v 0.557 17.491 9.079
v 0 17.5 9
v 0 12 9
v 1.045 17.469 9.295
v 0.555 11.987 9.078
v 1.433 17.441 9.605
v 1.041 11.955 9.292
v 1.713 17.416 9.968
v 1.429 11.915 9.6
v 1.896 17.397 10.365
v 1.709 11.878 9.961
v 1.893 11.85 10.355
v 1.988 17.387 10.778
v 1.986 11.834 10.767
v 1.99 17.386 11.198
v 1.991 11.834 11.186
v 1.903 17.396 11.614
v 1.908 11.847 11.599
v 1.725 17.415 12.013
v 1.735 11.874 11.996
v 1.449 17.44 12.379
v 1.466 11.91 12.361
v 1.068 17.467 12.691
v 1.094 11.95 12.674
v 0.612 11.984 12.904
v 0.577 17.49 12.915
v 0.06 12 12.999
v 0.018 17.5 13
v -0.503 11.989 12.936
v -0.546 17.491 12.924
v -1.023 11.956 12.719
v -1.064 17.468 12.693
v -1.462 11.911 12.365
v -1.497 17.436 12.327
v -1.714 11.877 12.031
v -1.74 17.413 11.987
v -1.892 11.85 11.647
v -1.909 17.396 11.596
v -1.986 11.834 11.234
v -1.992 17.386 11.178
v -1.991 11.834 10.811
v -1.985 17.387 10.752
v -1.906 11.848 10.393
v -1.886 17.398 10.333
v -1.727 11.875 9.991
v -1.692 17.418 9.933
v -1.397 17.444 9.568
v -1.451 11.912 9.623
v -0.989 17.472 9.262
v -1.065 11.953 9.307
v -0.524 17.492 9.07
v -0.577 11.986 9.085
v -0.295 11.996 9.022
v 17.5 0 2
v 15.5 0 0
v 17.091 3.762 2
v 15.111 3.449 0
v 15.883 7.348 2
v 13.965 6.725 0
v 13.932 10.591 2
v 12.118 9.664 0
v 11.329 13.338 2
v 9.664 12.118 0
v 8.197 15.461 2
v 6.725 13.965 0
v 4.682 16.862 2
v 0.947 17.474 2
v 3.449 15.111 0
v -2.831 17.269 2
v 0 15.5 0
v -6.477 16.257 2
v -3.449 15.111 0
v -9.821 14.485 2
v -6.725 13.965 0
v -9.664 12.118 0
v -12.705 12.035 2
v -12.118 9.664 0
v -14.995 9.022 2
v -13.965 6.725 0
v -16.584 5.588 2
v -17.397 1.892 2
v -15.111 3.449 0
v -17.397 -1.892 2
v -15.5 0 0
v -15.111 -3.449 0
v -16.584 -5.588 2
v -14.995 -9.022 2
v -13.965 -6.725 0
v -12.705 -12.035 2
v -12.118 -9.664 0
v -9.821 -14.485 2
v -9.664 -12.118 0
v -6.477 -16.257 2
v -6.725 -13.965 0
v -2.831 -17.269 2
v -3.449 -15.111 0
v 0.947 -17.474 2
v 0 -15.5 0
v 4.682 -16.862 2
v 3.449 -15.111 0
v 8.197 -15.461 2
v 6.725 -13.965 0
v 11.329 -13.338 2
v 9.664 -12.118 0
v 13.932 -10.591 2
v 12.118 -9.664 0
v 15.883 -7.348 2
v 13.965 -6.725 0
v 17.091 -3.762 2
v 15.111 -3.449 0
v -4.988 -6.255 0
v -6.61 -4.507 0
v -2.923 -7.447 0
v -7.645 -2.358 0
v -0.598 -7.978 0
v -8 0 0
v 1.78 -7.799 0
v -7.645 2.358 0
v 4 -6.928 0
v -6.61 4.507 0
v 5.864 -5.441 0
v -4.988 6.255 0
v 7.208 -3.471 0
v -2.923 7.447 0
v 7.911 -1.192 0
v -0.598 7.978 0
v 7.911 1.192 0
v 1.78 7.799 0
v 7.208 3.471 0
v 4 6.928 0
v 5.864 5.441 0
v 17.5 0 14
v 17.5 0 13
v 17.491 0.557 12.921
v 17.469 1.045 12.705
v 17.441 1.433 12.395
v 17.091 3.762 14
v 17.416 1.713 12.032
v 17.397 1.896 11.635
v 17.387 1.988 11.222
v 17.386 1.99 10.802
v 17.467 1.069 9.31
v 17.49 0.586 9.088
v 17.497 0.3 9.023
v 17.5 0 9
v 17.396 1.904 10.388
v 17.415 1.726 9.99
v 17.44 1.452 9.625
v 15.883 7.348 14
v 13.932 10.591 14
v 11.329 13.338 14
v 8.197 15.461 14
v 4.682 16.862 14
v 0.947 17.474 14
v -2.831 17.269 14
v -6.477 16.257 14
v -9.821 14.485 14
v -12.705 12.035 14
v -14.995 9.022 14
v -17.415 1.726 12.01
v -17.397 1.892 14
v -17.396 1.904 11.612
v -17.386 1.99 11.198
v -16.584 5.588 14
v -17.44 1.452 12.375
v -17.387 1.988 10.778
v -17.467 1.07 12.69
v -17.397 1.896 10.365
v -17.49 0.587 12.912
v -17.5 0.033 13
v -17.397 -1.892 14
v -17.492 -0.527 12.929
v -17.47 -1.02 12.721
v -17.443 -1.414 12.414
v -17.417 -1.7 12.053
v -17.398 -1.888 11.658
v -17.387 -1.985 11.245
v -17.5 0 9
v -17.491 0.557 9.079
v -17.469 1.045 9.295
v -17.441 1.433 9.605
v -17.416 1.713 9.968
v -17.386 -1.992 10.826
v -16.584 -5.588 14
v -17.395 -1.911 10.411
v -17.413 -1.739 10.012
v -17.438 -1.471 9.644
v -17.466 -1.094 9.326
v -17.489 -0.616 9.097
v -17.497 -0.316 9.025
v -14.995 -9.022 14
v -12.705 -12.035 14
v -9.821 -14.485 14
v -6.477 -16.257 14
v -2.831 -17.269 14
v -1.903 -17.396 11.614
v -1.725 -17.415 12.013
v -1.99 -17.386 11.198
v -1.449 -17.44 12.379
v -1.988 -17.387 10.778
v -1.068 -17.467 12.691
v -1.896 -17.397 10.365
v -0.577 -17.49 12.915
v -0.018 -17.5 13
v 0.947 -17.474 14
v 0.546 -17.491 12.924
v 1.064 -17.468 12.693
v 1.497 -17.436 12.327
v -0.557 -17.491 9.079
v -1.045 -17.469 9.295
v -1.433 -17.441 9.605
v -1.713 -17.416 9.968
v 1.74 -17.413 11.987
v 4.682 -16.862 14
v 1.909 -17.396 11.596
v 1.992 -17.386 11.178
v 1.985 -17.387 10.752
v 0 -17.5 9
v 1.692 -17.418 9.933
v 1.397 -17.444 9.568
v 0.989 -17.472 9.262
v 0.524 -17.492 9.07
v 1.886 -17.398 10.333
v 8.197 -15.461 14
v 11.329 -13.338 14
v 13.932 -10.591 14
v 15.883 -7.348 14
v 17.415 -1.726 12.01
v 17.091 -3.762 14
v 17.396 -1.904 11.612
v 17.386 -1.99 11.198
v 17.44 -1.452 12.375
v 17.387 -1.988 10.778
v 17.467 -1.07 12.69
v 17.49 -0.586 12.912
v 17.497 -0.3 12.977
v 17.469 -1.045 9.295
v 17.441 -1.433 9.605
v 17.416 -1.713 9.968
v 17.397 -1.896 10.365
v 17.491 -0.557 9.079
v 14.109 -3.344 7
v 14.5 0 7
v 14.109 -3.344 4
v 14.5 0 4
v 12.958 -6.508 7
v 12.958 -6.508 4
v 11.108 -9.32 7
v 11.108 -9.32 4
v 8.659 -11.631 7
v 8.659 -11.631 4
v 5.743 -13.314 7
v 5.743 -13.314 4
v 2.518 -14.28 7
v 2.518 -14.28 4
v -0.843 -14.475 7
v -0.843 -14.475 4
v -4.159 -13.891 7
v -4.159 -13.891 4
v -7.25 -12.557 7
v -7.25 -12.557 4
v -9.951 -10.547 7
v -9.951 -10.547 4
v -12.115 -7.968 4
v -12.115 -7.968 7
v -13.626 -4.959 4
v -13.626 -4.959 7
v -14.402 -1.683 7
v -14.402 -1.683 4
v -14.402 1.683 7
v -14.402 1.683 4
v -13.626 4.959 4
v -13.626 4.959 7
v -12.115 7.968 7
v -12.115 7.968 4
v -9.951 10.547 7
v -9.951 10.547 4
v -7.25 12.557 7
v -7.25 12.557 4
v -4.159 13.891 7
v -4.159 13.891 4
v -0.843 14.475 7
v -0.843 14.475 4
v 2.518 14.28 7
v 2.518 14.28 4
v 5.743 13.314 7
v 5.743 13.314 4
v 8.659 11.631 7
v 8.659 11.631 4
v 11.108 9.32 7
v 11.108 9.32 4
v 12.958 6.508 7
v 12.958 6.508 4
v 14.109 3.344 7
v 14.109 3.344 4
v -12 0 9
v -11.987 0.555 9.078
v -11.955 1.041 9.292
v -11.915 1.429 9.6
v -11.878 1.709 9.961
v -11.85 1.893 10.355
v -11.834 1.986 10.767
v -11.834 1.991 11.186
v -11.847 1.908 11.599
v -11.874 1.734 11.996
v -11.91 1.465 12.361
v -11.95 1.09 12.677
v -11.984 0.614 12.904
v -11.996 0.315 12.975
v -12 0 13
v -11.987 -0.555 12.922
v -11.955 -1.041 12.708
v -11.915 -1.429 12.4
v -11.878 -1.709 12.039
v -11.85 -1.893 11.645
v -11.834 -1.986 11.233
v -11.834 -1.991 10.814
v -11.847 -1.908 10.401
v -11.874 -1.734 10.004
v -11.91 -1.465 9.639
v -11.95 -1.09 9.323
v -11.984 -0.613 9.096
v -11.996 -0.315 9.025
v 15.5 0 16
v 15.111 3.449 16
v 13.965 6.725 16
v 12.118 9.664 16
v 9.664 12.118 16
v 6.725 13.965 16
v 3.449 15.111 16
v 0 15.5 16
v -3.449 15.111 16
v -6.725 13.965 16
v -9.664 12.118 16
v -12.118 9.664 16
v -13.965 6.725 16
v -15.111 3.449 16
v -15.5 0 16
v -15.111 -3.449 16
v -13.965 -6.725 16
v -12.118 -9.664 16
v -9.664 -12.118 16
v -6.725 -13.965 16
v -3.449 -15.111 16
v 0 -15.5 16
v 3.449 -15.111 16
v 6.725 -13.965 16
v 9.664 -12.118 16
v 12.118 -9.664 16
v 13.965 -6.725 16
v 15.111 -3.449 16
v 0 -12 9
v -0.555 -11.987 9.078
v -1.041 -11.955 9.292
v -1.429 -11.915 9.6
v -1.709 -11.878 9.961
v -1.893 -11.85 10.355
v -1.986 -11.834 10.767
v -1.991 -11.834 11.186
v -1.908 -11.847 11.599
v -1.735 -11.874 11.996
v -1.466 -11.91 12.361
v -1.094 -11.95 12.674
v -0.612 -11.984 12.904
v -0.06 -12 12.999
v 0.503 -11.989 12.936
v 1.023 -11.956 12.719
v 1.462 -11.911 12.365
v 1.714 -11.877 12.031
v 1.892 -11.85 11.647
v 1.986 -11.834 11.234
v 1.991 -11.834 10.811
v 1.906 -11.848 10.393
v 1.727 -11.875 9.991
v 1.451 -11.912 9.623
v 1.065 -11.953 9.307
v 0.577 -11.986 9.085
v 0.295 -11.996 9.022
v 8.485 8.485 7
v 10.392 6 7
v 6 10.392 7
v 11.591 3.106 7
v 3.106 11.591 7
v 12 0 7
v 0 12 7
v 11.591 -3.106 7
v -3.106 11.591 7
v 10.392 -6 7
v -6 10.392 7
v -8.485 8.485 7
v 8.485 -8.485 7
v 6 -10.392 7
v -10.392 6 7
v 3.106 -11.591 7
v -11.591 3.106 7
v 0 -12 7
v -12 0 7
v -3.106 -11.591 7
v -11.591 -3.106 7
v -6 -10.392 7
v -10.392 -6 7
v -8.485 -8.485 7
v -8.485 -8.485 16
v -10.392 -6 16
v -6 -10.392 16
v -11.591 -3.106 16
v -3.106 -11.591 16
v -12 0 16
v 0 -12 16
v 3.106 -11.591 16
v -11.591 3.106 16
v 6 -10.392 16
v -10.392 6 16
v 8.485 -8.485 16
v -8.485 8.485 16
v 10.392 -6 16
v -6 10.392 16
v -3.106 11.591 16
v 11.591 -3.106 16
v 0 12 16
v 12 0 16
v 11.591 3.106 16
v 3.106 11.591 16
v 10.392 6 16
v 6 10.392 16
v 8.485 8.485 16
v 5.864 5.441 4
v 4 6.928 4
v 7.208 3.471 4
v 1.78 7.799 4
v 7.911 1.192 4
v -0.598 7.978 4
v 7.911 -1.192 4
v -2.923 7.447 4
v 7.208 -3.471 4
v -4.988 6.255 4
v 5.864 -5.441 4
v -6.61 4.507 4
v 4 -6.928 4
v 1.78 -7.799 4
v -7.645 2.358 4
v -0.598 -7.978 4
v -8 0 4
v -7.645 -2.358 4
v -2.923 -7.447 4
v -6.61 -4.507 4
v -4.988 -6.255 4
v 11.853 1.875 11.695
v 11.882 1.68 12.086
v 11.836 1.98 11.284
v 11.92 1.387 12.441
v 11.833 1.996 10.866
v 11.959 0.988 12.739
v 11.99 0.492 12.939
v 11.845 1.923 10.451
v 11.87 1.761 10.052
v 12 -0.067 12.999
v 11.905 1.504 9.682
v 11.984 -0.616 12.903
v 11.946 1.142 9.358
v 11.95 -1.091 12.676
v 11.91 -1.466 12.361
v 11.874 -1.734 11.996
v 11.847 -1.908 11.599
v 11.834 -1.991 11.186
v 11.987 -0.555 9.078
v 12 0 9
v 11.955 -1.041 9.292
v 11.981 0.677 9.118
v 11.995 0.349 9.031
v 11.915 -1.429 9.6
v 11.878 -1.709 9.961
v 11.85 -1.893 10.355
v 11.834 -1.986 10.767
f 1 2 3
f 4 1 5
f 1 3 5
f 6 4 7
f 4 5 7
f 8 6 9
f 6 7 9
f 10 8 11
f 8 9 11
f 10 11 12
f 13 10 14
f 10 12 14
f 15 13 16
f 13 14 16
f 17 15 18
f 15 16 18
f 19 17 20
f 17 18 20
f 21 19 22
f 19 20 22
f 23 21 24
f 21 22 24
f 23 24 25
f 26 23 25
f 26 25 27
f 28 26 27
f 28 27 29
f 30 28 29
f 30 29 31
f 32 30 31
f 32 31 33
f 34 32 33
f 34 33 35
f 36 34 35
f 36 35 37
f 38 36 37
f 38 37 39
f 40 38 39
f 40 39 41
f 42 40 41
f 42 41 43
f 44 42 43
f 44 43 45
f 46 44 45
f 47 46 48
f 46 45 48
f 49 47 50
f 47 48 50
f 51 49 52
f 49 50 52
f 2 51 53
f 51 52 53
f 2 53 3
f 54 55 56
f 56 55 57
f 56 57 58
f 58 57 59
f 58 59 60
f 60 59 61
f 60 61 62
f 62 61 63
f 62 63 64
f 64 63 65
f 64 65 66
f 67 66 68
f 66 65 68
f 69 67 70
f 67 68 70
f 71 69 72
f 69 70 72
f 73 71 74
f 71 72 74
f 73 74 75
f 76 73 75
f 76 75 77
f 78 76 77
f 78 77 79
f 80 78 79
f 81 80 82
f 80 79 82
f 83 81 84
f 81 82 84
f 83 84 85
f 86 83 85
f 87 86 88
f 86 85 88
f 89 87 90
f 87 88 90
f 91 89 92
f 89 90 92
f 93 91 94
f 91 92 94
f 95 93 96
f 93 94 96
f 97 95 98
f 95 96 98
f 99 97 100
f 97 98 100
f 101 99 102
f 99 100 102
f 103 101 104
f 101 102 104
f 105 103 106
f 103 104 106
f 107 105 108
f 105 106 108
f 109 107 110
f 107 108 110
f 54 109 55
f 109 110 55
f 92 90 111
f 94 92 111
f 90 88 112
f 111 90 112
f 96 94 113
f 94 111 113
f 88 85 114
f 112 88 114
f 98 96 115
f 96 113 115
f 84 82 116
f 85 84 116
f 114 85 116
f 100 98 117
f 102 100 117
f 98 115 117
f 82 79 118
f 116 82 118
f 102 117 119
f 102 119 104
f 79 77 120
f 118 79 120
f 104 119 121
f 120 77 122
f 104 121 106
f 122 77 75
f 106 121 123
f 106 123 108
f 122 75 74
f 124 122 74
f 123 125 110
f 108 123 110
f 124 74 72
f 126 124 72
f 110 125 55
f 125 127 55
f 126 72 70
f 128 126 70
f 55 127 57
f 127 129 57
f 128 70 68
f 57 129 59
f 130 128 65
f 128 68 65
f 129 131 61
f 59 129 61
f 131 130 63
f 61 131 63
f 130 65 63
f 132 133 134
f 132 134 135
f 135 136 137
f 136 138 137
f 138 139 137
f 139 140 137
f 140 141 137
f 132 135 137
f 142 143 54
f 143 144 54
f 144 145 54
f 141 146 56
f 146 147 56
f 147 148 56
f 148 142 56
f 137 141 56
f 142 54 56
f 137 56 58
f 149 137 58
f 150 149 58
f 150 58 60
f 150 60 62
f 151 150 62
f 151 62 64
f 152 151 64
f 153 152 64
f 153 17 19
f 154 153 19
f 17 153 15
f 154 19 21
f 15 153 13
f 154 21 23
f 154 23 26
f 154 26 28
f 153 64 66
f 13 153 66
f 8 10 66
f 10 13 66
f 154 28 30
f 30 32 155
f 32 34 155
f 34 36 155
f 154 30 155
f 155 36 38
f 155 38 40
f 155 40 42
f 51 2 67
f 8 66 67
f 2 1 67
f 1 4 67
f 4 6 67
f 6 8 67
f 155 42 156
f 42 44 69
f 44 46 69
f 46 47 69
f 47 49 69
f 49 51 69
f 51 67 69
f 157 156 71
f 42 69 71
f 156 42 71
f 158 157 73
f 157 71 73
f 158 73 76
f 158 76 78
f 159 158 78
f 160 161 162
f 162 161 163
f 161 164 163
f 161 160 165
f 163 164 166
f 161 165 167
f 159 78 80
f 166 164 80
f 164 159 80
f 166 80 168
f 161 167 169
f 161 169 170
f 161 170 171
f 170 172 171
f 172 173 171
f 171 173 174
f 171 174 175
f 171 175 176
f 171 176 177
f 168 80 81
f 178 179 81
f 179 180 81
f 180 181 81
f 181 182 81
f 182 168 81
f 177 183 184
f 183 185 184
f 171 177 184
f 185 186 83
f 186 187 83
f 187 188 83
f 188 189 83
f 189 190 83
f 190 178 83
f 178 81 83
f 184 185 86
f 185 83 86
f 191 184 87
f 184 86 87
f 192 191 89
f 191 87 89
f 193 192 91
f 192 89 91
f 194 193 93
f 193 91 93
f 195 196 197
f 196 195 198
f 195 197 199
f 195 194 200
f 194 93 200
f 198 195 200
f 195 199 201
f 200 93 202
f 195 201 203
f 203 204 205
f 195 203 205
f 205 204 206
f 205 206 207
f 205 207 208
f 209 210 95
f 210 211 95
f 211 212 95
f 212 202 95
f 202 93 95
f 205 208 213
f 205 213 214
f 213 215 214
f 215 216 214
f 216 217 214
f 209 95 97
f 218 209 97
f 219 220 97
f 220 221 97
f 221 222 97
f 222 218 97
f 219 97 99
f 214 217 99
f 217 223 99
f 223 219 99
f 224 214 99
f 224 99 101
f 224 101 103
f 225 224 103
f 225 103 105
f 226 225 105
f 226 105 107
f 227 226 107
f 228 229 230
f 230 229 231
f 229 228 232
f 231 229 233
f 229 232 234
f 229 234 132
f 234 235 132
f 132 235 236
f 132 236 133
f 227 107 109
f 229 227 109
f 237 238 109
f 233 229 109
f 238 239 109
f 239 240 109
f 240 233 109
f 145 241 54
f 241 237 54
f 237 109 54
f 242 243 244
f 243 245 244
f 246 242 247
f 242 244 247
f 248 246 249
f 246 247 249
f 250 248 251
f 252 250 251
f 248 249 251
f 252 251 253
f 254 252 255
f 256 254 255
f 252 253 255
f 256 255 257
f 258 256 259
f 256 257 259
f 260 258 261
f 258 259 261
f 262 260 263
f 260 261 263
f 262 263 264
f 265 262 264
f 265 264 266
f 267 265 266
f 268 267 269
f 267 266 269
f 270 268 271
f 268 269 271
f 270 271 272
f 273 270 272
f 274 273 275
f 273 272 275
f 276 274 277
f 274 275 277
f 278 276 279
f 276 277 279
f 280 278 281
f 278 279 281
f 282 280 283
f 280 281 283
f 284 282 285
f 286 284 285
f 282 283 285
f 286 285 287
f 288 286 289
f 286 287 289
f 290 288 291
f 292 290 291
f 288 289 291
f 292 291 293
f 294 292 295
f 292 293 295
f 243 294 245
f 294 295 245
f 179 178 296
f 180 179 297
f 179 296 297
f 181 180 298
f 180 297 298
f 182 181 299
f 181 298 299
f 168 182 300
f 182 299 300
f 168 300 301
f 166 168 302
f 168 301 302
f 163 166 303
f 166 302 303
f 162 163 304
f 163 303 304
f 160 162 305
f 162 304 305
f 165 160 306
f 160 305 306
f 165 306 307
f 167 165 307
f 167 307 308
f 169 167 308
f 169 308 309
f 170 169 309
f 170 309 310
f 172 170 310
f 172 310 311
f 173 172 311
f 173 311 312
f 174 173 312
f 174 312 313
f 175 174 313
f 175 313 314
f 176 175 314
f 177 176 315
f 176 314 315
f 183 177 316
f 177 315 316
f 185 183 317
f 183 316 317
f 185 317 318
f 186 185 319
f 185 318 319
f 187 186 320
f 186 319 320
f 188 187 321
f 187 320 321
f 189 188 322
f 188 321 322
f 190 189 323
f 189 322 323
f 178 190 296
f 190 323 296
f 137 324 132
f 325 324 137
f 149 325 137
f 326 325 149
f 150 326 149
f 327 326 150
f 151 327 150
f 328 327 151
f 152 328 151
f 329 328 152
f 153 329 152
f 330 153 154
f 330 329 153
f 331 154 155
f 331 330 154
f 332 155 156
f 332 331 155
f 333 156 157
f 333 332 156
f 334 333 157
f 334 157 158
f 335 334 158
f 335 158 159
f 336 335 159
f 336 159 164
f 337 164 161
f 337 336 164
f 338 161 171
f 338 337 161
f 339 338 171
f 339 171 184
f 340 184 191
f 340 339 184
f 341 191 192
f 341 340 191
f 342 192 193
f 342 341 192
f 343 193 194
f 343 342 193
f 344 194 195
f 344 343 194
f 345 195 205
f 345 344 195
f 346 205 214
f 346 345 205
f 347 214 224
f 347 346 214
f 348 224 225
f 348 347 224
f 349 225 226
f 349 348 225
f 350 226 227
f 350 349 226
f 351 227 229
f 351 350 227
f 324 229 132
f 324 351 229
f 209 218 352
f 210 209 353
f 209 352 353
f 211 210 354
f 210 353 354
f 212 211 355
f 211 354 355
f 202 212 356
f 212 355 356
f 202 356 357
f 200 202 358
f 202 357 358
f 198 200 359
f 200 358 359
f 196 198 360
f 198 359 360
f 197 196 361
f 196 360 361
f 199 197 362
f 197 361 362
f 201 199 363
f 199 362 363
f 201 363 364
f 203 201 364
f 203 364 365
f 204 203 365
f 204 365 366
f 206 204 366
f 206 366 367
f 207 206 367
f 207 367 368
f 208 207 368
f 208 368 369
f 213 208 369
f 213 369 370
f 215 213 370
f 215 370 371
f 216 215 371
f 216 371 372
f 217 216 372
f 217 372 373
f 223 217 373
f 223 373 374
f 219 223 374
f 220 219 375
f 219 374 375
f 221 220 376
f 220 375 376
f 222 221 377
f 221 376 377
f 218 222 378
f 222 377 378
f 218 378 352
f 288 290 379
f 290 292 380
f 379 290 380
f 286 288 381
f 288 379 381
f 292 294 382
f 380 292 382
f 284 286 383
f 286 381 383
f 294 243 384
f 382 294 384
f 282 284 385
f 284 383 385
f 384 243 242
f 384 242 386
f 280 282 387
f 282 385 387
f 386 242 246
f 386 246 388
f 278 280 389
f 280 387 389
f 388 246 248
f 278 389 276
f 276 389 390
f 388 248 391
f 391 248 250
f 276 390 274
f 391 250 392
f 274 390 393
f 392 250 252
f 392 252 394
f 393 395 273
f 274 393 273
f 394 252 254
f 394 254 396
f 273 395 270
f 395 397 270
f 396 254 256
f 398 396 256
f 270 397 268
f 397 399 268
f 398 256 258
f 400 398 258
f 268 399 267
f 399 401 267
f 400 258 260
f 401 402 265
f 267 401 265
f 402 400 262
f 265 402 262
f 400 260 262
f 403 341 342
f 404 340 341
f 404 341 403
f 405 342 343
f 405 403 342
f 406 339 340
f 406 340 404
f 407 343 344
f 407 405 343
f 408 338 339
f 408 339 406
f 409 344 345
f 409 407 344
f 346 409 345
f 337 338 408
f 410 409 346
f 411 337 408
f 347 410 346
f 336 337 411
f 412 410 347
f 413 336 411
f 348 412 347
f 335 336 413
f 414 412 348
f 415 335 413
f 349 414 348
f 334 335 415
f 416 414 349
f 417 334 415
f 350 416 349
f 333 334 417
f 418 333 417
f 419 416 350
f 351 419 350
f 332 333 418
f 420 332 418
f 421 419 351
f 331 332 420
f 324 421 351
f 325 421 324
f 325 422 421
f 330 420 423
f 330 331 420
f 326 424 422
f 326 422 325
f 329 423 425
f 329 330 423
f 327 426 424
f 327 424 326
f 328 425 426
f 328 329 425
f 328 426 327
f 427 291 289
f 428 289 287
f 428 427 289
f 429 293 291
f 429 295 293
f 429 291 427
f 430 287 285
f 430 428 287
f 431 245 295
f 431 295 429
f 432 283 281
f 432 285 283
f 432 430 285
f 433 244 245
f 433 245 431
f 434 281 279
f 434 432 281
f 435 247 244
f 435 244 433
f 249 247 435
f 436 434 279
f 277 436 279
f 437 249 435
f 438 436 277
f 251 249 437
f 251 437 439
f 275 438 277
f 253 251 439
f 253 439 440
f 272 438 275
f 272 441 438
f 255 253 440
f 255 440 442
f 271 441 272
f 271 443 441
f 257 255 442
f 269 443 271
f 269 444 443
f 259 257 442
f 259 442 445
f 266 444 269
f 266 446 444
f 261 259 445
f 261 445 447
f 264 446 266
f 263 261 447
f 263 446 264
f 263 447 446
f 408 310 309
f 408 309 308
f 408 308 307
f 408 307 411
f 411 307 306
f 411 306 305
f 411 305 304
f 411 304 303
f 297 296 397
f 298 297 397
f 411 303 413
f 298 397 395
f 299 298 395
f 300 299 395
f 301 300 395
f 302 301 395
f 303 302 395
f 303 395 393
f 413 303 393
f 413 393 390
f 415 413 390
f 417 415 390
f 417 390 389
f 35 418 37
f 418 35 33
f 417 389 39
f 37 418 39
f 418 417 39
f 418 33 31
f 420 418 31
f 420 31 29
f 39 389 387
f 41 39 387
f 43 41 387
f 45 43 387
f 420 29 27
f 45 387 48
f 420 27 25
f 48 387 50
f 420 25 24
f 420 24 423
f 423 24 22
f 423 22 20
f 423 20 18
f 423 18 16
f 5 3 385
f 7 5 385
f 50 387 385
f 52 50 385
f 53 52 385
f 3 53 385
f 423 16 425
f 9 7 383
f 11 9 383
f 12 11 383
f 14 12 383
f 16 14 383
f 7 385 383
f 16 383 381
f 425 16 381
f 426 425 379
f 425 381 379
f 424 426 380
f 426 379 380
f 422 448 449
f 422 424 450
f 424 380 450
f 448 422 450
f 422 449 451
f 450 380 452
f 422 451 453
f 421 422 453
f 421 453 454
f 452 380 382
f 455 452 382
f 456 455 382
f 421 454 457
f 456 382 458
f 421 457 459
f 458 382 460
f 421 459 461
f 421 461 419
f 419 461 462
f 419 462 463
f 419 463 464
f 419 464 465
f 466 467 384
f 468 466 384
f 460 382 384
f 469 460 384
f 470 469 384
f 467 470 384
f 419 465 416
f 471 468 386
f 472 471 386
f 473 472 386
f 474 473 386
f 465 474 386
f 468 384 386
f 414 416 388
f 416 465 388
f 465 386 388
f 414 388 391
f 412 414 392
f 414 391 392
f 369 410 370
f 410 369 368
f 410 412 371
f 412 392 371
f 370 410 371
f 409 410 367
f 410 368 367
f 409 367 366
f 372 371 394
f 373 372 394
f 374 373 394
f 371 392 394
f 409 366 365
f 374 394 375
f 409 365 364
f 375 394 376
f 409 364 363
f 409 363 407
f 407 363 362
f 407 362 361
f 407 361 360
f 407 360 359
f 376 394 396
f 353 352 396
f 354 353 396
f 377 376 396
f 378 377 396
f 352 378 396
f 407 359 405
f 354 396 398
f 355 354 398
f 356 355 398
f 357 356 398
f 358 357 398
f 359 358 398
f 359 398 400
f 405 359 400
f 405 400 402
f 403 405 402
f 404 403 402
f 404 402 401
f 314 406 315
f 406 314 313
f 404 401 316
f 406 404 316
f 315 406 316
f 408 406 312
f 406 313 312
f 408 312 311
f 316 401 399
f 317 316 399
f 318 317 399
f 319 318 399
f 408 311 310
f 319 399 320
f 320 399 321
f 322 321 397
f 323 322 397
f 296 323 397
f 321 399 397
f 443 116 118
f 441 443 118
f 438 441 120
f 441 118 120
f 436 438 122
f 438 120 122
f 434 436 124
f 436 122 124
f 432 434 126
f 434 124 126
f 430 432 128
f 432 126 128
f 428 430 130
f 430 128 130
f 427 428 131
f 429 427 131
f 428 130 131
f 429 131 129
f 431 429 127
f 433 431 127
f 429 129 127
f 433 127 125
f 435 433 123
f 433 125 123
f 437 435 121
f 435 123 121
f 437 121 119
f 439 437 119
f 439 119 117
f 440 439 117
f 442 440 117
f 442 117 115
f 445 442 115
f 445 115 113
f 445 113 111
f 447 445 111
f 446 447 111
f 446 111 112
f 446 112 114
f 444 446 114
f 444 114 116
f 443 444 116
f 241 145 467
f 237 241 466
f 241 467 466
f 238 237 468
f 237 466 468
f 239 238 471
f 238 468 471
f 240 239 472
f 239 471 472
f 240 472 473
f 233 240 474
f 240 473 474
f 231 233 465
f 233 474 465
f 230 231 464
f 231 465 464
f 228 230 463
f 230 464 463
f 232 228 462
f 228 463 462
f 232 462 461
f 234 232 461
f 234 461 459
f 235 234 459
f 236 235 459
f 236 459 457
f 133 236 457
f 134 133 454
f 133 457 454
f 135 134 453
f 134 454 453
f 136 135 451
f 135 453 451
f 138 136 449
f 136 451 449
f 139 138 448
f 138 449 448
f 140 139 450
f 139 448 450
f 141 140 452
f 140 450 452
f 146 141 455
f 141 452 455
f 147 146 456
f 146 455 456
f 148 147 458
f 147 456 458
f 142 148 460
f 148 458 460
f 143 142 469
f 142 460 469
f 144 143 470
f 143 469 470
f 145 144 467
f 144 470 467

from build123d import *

# Parameters (mm, degrees)
SKETCH_1_R               = 17.5
EXTRUDE_1_DEPTH          = 16
HOLE_WIZARD_M27_1_D      = 24
HOLE_WIZARD_M27_1_DEPTH  = 9
HOLE_WIZARD_M27_1_TIP    = 6.92820323
SKETCH_4_R               = 17.5
EXTRUDE_2_DEPTH          = 4
SKETCH_5_W               = 3
SKETCH_5_H               = 10
SKETCH_6_R               = 2
CUT_EXTRUDE_1_DEPTH      = 30.470324057
PATTERN_CIRCULAR_1_COUNT = 4
SKETCH_7_R               = 8
CUT_EXTRUDE_2_DEPTH      = 30.47032423
CHAMFER_1_SIZE           = 2


with BuildPart() as part:
    # 草图1 → 凸台-拉伸1 (new body)
    with BuildSketch(Plane.XY):
        Circle(SKETCH_1_R)
    extrude(amount=EXTRUDE_1_DEPTH)

    # M27 螺纹孔1
    with Locations(Plane.XY.offset(16)):
        with Locations((0, 0)):
            Hole(HOLE_WIZARD_M27_1_D / 2, depth=HOLE_WIZARD_M27_1_DEPTH)
            with Locations((0, 0, -(HOLE_WIZARD_M27_1_DEPTH + HOLE_WIZARD_M27_1_TIP / 2))):  # 120° drill point
                Cone(0, HOLE_WIZARD_M27_1_D / 2, HOLE_WIZARD_M27_1_TIP, mode=Mode.SUBTRACT)

    # 草图4 → 凸台-拉伸2 (add)
    with BuildSketch(Plane(origin=(0, 0, 0), x_dir=(-1, 0, 0), z_dir=(0, 0, -1))):
        with Locations(Location((0, 0, 0), (0, 0, 180))):
            Circle(SKETCH_4_R)
    extrude_2 = extrude(amount=-EXTRUDE_2_DEPTH)

    # 草图5 → 切除-旋转1 (revolve, cut)
    with BuildSketch(Plane(origin=(0, 0, 0), x_dir=(0, 0, -1), z_dir=(1, 0, 0)), mode=Mode.PRIVATE) as cut_revolve_1_sk:
        with Locations((-5.5, 9.5)):
            Rectangle(SKETCH_5_W, SKETCH_5_H)
    revolve(cut_revolve_1_sk.sketch.rotate(Axis((0, 0, 16), (0, 0, -1)), 90), axis=Axis((0, 0, 16), (0, 0, -1)), mode=Mode.SUBTRACT)

    # 草图6 → 切除-拉伸1 (cut, through all)
    with BuildSketch(Plane(origin=(0, 0, 0), x_dir=(0, 0, -1), z_dir=(1, 0, 0))):
        with Locations((-11, 0)):
            Circle(SKETCH_6_R)
    cut_extrude_1 = extrude(amount=-CUT_EXTRUDE_1_DEPTH, mode=Mode.SUBTRACT)

    # 阵列(圆周)1: 凸台-拉伸2, 切除-拉伸1 ×4 about axis
    pattern_circular_1_axis = Axis((0, 0, 16), (0, 0, -1))
    add([extrude_2.rotate(pattern_circular_1_axis, i * 360 / PATTERN_CIRCULAR_1_COUNT) for i in range(1, PATTERN_CIRCULAR_1_COUNT)])
    add([cut_extrude_1.rotate(pattern_circular_1_axis, i * 360 / PATTERN_CIRCULAR_1_COUNT) for i in range(1, PATTERN_CIRCULAR_1_COUNT)], mode=Mode.SUBTRACT)

    # 草图7 → 切除-拉伸2 (cut, through all)
    with BuildSketch(Plane(origin=(0, 0, 0), x_dir=(-1, 0, 0), z_dir=(0, 0, -1))):
        Circle(SKETCH_7_R)
    extrude(amount=-CUT_EXTRUDE_2_DEPTH, mode=Mode.SUBTRACT)

    # 倒角1
    chamfer_1_edges = [part.edges().sort_by_distance(p)[0] for p in [
        (-17.5, 0, 0),
        (-17.5, 0, 16),
    ]]
    chamfer(chamfer_1_edges, length=CHAMFER_1_SIZE)


solid = part.part
